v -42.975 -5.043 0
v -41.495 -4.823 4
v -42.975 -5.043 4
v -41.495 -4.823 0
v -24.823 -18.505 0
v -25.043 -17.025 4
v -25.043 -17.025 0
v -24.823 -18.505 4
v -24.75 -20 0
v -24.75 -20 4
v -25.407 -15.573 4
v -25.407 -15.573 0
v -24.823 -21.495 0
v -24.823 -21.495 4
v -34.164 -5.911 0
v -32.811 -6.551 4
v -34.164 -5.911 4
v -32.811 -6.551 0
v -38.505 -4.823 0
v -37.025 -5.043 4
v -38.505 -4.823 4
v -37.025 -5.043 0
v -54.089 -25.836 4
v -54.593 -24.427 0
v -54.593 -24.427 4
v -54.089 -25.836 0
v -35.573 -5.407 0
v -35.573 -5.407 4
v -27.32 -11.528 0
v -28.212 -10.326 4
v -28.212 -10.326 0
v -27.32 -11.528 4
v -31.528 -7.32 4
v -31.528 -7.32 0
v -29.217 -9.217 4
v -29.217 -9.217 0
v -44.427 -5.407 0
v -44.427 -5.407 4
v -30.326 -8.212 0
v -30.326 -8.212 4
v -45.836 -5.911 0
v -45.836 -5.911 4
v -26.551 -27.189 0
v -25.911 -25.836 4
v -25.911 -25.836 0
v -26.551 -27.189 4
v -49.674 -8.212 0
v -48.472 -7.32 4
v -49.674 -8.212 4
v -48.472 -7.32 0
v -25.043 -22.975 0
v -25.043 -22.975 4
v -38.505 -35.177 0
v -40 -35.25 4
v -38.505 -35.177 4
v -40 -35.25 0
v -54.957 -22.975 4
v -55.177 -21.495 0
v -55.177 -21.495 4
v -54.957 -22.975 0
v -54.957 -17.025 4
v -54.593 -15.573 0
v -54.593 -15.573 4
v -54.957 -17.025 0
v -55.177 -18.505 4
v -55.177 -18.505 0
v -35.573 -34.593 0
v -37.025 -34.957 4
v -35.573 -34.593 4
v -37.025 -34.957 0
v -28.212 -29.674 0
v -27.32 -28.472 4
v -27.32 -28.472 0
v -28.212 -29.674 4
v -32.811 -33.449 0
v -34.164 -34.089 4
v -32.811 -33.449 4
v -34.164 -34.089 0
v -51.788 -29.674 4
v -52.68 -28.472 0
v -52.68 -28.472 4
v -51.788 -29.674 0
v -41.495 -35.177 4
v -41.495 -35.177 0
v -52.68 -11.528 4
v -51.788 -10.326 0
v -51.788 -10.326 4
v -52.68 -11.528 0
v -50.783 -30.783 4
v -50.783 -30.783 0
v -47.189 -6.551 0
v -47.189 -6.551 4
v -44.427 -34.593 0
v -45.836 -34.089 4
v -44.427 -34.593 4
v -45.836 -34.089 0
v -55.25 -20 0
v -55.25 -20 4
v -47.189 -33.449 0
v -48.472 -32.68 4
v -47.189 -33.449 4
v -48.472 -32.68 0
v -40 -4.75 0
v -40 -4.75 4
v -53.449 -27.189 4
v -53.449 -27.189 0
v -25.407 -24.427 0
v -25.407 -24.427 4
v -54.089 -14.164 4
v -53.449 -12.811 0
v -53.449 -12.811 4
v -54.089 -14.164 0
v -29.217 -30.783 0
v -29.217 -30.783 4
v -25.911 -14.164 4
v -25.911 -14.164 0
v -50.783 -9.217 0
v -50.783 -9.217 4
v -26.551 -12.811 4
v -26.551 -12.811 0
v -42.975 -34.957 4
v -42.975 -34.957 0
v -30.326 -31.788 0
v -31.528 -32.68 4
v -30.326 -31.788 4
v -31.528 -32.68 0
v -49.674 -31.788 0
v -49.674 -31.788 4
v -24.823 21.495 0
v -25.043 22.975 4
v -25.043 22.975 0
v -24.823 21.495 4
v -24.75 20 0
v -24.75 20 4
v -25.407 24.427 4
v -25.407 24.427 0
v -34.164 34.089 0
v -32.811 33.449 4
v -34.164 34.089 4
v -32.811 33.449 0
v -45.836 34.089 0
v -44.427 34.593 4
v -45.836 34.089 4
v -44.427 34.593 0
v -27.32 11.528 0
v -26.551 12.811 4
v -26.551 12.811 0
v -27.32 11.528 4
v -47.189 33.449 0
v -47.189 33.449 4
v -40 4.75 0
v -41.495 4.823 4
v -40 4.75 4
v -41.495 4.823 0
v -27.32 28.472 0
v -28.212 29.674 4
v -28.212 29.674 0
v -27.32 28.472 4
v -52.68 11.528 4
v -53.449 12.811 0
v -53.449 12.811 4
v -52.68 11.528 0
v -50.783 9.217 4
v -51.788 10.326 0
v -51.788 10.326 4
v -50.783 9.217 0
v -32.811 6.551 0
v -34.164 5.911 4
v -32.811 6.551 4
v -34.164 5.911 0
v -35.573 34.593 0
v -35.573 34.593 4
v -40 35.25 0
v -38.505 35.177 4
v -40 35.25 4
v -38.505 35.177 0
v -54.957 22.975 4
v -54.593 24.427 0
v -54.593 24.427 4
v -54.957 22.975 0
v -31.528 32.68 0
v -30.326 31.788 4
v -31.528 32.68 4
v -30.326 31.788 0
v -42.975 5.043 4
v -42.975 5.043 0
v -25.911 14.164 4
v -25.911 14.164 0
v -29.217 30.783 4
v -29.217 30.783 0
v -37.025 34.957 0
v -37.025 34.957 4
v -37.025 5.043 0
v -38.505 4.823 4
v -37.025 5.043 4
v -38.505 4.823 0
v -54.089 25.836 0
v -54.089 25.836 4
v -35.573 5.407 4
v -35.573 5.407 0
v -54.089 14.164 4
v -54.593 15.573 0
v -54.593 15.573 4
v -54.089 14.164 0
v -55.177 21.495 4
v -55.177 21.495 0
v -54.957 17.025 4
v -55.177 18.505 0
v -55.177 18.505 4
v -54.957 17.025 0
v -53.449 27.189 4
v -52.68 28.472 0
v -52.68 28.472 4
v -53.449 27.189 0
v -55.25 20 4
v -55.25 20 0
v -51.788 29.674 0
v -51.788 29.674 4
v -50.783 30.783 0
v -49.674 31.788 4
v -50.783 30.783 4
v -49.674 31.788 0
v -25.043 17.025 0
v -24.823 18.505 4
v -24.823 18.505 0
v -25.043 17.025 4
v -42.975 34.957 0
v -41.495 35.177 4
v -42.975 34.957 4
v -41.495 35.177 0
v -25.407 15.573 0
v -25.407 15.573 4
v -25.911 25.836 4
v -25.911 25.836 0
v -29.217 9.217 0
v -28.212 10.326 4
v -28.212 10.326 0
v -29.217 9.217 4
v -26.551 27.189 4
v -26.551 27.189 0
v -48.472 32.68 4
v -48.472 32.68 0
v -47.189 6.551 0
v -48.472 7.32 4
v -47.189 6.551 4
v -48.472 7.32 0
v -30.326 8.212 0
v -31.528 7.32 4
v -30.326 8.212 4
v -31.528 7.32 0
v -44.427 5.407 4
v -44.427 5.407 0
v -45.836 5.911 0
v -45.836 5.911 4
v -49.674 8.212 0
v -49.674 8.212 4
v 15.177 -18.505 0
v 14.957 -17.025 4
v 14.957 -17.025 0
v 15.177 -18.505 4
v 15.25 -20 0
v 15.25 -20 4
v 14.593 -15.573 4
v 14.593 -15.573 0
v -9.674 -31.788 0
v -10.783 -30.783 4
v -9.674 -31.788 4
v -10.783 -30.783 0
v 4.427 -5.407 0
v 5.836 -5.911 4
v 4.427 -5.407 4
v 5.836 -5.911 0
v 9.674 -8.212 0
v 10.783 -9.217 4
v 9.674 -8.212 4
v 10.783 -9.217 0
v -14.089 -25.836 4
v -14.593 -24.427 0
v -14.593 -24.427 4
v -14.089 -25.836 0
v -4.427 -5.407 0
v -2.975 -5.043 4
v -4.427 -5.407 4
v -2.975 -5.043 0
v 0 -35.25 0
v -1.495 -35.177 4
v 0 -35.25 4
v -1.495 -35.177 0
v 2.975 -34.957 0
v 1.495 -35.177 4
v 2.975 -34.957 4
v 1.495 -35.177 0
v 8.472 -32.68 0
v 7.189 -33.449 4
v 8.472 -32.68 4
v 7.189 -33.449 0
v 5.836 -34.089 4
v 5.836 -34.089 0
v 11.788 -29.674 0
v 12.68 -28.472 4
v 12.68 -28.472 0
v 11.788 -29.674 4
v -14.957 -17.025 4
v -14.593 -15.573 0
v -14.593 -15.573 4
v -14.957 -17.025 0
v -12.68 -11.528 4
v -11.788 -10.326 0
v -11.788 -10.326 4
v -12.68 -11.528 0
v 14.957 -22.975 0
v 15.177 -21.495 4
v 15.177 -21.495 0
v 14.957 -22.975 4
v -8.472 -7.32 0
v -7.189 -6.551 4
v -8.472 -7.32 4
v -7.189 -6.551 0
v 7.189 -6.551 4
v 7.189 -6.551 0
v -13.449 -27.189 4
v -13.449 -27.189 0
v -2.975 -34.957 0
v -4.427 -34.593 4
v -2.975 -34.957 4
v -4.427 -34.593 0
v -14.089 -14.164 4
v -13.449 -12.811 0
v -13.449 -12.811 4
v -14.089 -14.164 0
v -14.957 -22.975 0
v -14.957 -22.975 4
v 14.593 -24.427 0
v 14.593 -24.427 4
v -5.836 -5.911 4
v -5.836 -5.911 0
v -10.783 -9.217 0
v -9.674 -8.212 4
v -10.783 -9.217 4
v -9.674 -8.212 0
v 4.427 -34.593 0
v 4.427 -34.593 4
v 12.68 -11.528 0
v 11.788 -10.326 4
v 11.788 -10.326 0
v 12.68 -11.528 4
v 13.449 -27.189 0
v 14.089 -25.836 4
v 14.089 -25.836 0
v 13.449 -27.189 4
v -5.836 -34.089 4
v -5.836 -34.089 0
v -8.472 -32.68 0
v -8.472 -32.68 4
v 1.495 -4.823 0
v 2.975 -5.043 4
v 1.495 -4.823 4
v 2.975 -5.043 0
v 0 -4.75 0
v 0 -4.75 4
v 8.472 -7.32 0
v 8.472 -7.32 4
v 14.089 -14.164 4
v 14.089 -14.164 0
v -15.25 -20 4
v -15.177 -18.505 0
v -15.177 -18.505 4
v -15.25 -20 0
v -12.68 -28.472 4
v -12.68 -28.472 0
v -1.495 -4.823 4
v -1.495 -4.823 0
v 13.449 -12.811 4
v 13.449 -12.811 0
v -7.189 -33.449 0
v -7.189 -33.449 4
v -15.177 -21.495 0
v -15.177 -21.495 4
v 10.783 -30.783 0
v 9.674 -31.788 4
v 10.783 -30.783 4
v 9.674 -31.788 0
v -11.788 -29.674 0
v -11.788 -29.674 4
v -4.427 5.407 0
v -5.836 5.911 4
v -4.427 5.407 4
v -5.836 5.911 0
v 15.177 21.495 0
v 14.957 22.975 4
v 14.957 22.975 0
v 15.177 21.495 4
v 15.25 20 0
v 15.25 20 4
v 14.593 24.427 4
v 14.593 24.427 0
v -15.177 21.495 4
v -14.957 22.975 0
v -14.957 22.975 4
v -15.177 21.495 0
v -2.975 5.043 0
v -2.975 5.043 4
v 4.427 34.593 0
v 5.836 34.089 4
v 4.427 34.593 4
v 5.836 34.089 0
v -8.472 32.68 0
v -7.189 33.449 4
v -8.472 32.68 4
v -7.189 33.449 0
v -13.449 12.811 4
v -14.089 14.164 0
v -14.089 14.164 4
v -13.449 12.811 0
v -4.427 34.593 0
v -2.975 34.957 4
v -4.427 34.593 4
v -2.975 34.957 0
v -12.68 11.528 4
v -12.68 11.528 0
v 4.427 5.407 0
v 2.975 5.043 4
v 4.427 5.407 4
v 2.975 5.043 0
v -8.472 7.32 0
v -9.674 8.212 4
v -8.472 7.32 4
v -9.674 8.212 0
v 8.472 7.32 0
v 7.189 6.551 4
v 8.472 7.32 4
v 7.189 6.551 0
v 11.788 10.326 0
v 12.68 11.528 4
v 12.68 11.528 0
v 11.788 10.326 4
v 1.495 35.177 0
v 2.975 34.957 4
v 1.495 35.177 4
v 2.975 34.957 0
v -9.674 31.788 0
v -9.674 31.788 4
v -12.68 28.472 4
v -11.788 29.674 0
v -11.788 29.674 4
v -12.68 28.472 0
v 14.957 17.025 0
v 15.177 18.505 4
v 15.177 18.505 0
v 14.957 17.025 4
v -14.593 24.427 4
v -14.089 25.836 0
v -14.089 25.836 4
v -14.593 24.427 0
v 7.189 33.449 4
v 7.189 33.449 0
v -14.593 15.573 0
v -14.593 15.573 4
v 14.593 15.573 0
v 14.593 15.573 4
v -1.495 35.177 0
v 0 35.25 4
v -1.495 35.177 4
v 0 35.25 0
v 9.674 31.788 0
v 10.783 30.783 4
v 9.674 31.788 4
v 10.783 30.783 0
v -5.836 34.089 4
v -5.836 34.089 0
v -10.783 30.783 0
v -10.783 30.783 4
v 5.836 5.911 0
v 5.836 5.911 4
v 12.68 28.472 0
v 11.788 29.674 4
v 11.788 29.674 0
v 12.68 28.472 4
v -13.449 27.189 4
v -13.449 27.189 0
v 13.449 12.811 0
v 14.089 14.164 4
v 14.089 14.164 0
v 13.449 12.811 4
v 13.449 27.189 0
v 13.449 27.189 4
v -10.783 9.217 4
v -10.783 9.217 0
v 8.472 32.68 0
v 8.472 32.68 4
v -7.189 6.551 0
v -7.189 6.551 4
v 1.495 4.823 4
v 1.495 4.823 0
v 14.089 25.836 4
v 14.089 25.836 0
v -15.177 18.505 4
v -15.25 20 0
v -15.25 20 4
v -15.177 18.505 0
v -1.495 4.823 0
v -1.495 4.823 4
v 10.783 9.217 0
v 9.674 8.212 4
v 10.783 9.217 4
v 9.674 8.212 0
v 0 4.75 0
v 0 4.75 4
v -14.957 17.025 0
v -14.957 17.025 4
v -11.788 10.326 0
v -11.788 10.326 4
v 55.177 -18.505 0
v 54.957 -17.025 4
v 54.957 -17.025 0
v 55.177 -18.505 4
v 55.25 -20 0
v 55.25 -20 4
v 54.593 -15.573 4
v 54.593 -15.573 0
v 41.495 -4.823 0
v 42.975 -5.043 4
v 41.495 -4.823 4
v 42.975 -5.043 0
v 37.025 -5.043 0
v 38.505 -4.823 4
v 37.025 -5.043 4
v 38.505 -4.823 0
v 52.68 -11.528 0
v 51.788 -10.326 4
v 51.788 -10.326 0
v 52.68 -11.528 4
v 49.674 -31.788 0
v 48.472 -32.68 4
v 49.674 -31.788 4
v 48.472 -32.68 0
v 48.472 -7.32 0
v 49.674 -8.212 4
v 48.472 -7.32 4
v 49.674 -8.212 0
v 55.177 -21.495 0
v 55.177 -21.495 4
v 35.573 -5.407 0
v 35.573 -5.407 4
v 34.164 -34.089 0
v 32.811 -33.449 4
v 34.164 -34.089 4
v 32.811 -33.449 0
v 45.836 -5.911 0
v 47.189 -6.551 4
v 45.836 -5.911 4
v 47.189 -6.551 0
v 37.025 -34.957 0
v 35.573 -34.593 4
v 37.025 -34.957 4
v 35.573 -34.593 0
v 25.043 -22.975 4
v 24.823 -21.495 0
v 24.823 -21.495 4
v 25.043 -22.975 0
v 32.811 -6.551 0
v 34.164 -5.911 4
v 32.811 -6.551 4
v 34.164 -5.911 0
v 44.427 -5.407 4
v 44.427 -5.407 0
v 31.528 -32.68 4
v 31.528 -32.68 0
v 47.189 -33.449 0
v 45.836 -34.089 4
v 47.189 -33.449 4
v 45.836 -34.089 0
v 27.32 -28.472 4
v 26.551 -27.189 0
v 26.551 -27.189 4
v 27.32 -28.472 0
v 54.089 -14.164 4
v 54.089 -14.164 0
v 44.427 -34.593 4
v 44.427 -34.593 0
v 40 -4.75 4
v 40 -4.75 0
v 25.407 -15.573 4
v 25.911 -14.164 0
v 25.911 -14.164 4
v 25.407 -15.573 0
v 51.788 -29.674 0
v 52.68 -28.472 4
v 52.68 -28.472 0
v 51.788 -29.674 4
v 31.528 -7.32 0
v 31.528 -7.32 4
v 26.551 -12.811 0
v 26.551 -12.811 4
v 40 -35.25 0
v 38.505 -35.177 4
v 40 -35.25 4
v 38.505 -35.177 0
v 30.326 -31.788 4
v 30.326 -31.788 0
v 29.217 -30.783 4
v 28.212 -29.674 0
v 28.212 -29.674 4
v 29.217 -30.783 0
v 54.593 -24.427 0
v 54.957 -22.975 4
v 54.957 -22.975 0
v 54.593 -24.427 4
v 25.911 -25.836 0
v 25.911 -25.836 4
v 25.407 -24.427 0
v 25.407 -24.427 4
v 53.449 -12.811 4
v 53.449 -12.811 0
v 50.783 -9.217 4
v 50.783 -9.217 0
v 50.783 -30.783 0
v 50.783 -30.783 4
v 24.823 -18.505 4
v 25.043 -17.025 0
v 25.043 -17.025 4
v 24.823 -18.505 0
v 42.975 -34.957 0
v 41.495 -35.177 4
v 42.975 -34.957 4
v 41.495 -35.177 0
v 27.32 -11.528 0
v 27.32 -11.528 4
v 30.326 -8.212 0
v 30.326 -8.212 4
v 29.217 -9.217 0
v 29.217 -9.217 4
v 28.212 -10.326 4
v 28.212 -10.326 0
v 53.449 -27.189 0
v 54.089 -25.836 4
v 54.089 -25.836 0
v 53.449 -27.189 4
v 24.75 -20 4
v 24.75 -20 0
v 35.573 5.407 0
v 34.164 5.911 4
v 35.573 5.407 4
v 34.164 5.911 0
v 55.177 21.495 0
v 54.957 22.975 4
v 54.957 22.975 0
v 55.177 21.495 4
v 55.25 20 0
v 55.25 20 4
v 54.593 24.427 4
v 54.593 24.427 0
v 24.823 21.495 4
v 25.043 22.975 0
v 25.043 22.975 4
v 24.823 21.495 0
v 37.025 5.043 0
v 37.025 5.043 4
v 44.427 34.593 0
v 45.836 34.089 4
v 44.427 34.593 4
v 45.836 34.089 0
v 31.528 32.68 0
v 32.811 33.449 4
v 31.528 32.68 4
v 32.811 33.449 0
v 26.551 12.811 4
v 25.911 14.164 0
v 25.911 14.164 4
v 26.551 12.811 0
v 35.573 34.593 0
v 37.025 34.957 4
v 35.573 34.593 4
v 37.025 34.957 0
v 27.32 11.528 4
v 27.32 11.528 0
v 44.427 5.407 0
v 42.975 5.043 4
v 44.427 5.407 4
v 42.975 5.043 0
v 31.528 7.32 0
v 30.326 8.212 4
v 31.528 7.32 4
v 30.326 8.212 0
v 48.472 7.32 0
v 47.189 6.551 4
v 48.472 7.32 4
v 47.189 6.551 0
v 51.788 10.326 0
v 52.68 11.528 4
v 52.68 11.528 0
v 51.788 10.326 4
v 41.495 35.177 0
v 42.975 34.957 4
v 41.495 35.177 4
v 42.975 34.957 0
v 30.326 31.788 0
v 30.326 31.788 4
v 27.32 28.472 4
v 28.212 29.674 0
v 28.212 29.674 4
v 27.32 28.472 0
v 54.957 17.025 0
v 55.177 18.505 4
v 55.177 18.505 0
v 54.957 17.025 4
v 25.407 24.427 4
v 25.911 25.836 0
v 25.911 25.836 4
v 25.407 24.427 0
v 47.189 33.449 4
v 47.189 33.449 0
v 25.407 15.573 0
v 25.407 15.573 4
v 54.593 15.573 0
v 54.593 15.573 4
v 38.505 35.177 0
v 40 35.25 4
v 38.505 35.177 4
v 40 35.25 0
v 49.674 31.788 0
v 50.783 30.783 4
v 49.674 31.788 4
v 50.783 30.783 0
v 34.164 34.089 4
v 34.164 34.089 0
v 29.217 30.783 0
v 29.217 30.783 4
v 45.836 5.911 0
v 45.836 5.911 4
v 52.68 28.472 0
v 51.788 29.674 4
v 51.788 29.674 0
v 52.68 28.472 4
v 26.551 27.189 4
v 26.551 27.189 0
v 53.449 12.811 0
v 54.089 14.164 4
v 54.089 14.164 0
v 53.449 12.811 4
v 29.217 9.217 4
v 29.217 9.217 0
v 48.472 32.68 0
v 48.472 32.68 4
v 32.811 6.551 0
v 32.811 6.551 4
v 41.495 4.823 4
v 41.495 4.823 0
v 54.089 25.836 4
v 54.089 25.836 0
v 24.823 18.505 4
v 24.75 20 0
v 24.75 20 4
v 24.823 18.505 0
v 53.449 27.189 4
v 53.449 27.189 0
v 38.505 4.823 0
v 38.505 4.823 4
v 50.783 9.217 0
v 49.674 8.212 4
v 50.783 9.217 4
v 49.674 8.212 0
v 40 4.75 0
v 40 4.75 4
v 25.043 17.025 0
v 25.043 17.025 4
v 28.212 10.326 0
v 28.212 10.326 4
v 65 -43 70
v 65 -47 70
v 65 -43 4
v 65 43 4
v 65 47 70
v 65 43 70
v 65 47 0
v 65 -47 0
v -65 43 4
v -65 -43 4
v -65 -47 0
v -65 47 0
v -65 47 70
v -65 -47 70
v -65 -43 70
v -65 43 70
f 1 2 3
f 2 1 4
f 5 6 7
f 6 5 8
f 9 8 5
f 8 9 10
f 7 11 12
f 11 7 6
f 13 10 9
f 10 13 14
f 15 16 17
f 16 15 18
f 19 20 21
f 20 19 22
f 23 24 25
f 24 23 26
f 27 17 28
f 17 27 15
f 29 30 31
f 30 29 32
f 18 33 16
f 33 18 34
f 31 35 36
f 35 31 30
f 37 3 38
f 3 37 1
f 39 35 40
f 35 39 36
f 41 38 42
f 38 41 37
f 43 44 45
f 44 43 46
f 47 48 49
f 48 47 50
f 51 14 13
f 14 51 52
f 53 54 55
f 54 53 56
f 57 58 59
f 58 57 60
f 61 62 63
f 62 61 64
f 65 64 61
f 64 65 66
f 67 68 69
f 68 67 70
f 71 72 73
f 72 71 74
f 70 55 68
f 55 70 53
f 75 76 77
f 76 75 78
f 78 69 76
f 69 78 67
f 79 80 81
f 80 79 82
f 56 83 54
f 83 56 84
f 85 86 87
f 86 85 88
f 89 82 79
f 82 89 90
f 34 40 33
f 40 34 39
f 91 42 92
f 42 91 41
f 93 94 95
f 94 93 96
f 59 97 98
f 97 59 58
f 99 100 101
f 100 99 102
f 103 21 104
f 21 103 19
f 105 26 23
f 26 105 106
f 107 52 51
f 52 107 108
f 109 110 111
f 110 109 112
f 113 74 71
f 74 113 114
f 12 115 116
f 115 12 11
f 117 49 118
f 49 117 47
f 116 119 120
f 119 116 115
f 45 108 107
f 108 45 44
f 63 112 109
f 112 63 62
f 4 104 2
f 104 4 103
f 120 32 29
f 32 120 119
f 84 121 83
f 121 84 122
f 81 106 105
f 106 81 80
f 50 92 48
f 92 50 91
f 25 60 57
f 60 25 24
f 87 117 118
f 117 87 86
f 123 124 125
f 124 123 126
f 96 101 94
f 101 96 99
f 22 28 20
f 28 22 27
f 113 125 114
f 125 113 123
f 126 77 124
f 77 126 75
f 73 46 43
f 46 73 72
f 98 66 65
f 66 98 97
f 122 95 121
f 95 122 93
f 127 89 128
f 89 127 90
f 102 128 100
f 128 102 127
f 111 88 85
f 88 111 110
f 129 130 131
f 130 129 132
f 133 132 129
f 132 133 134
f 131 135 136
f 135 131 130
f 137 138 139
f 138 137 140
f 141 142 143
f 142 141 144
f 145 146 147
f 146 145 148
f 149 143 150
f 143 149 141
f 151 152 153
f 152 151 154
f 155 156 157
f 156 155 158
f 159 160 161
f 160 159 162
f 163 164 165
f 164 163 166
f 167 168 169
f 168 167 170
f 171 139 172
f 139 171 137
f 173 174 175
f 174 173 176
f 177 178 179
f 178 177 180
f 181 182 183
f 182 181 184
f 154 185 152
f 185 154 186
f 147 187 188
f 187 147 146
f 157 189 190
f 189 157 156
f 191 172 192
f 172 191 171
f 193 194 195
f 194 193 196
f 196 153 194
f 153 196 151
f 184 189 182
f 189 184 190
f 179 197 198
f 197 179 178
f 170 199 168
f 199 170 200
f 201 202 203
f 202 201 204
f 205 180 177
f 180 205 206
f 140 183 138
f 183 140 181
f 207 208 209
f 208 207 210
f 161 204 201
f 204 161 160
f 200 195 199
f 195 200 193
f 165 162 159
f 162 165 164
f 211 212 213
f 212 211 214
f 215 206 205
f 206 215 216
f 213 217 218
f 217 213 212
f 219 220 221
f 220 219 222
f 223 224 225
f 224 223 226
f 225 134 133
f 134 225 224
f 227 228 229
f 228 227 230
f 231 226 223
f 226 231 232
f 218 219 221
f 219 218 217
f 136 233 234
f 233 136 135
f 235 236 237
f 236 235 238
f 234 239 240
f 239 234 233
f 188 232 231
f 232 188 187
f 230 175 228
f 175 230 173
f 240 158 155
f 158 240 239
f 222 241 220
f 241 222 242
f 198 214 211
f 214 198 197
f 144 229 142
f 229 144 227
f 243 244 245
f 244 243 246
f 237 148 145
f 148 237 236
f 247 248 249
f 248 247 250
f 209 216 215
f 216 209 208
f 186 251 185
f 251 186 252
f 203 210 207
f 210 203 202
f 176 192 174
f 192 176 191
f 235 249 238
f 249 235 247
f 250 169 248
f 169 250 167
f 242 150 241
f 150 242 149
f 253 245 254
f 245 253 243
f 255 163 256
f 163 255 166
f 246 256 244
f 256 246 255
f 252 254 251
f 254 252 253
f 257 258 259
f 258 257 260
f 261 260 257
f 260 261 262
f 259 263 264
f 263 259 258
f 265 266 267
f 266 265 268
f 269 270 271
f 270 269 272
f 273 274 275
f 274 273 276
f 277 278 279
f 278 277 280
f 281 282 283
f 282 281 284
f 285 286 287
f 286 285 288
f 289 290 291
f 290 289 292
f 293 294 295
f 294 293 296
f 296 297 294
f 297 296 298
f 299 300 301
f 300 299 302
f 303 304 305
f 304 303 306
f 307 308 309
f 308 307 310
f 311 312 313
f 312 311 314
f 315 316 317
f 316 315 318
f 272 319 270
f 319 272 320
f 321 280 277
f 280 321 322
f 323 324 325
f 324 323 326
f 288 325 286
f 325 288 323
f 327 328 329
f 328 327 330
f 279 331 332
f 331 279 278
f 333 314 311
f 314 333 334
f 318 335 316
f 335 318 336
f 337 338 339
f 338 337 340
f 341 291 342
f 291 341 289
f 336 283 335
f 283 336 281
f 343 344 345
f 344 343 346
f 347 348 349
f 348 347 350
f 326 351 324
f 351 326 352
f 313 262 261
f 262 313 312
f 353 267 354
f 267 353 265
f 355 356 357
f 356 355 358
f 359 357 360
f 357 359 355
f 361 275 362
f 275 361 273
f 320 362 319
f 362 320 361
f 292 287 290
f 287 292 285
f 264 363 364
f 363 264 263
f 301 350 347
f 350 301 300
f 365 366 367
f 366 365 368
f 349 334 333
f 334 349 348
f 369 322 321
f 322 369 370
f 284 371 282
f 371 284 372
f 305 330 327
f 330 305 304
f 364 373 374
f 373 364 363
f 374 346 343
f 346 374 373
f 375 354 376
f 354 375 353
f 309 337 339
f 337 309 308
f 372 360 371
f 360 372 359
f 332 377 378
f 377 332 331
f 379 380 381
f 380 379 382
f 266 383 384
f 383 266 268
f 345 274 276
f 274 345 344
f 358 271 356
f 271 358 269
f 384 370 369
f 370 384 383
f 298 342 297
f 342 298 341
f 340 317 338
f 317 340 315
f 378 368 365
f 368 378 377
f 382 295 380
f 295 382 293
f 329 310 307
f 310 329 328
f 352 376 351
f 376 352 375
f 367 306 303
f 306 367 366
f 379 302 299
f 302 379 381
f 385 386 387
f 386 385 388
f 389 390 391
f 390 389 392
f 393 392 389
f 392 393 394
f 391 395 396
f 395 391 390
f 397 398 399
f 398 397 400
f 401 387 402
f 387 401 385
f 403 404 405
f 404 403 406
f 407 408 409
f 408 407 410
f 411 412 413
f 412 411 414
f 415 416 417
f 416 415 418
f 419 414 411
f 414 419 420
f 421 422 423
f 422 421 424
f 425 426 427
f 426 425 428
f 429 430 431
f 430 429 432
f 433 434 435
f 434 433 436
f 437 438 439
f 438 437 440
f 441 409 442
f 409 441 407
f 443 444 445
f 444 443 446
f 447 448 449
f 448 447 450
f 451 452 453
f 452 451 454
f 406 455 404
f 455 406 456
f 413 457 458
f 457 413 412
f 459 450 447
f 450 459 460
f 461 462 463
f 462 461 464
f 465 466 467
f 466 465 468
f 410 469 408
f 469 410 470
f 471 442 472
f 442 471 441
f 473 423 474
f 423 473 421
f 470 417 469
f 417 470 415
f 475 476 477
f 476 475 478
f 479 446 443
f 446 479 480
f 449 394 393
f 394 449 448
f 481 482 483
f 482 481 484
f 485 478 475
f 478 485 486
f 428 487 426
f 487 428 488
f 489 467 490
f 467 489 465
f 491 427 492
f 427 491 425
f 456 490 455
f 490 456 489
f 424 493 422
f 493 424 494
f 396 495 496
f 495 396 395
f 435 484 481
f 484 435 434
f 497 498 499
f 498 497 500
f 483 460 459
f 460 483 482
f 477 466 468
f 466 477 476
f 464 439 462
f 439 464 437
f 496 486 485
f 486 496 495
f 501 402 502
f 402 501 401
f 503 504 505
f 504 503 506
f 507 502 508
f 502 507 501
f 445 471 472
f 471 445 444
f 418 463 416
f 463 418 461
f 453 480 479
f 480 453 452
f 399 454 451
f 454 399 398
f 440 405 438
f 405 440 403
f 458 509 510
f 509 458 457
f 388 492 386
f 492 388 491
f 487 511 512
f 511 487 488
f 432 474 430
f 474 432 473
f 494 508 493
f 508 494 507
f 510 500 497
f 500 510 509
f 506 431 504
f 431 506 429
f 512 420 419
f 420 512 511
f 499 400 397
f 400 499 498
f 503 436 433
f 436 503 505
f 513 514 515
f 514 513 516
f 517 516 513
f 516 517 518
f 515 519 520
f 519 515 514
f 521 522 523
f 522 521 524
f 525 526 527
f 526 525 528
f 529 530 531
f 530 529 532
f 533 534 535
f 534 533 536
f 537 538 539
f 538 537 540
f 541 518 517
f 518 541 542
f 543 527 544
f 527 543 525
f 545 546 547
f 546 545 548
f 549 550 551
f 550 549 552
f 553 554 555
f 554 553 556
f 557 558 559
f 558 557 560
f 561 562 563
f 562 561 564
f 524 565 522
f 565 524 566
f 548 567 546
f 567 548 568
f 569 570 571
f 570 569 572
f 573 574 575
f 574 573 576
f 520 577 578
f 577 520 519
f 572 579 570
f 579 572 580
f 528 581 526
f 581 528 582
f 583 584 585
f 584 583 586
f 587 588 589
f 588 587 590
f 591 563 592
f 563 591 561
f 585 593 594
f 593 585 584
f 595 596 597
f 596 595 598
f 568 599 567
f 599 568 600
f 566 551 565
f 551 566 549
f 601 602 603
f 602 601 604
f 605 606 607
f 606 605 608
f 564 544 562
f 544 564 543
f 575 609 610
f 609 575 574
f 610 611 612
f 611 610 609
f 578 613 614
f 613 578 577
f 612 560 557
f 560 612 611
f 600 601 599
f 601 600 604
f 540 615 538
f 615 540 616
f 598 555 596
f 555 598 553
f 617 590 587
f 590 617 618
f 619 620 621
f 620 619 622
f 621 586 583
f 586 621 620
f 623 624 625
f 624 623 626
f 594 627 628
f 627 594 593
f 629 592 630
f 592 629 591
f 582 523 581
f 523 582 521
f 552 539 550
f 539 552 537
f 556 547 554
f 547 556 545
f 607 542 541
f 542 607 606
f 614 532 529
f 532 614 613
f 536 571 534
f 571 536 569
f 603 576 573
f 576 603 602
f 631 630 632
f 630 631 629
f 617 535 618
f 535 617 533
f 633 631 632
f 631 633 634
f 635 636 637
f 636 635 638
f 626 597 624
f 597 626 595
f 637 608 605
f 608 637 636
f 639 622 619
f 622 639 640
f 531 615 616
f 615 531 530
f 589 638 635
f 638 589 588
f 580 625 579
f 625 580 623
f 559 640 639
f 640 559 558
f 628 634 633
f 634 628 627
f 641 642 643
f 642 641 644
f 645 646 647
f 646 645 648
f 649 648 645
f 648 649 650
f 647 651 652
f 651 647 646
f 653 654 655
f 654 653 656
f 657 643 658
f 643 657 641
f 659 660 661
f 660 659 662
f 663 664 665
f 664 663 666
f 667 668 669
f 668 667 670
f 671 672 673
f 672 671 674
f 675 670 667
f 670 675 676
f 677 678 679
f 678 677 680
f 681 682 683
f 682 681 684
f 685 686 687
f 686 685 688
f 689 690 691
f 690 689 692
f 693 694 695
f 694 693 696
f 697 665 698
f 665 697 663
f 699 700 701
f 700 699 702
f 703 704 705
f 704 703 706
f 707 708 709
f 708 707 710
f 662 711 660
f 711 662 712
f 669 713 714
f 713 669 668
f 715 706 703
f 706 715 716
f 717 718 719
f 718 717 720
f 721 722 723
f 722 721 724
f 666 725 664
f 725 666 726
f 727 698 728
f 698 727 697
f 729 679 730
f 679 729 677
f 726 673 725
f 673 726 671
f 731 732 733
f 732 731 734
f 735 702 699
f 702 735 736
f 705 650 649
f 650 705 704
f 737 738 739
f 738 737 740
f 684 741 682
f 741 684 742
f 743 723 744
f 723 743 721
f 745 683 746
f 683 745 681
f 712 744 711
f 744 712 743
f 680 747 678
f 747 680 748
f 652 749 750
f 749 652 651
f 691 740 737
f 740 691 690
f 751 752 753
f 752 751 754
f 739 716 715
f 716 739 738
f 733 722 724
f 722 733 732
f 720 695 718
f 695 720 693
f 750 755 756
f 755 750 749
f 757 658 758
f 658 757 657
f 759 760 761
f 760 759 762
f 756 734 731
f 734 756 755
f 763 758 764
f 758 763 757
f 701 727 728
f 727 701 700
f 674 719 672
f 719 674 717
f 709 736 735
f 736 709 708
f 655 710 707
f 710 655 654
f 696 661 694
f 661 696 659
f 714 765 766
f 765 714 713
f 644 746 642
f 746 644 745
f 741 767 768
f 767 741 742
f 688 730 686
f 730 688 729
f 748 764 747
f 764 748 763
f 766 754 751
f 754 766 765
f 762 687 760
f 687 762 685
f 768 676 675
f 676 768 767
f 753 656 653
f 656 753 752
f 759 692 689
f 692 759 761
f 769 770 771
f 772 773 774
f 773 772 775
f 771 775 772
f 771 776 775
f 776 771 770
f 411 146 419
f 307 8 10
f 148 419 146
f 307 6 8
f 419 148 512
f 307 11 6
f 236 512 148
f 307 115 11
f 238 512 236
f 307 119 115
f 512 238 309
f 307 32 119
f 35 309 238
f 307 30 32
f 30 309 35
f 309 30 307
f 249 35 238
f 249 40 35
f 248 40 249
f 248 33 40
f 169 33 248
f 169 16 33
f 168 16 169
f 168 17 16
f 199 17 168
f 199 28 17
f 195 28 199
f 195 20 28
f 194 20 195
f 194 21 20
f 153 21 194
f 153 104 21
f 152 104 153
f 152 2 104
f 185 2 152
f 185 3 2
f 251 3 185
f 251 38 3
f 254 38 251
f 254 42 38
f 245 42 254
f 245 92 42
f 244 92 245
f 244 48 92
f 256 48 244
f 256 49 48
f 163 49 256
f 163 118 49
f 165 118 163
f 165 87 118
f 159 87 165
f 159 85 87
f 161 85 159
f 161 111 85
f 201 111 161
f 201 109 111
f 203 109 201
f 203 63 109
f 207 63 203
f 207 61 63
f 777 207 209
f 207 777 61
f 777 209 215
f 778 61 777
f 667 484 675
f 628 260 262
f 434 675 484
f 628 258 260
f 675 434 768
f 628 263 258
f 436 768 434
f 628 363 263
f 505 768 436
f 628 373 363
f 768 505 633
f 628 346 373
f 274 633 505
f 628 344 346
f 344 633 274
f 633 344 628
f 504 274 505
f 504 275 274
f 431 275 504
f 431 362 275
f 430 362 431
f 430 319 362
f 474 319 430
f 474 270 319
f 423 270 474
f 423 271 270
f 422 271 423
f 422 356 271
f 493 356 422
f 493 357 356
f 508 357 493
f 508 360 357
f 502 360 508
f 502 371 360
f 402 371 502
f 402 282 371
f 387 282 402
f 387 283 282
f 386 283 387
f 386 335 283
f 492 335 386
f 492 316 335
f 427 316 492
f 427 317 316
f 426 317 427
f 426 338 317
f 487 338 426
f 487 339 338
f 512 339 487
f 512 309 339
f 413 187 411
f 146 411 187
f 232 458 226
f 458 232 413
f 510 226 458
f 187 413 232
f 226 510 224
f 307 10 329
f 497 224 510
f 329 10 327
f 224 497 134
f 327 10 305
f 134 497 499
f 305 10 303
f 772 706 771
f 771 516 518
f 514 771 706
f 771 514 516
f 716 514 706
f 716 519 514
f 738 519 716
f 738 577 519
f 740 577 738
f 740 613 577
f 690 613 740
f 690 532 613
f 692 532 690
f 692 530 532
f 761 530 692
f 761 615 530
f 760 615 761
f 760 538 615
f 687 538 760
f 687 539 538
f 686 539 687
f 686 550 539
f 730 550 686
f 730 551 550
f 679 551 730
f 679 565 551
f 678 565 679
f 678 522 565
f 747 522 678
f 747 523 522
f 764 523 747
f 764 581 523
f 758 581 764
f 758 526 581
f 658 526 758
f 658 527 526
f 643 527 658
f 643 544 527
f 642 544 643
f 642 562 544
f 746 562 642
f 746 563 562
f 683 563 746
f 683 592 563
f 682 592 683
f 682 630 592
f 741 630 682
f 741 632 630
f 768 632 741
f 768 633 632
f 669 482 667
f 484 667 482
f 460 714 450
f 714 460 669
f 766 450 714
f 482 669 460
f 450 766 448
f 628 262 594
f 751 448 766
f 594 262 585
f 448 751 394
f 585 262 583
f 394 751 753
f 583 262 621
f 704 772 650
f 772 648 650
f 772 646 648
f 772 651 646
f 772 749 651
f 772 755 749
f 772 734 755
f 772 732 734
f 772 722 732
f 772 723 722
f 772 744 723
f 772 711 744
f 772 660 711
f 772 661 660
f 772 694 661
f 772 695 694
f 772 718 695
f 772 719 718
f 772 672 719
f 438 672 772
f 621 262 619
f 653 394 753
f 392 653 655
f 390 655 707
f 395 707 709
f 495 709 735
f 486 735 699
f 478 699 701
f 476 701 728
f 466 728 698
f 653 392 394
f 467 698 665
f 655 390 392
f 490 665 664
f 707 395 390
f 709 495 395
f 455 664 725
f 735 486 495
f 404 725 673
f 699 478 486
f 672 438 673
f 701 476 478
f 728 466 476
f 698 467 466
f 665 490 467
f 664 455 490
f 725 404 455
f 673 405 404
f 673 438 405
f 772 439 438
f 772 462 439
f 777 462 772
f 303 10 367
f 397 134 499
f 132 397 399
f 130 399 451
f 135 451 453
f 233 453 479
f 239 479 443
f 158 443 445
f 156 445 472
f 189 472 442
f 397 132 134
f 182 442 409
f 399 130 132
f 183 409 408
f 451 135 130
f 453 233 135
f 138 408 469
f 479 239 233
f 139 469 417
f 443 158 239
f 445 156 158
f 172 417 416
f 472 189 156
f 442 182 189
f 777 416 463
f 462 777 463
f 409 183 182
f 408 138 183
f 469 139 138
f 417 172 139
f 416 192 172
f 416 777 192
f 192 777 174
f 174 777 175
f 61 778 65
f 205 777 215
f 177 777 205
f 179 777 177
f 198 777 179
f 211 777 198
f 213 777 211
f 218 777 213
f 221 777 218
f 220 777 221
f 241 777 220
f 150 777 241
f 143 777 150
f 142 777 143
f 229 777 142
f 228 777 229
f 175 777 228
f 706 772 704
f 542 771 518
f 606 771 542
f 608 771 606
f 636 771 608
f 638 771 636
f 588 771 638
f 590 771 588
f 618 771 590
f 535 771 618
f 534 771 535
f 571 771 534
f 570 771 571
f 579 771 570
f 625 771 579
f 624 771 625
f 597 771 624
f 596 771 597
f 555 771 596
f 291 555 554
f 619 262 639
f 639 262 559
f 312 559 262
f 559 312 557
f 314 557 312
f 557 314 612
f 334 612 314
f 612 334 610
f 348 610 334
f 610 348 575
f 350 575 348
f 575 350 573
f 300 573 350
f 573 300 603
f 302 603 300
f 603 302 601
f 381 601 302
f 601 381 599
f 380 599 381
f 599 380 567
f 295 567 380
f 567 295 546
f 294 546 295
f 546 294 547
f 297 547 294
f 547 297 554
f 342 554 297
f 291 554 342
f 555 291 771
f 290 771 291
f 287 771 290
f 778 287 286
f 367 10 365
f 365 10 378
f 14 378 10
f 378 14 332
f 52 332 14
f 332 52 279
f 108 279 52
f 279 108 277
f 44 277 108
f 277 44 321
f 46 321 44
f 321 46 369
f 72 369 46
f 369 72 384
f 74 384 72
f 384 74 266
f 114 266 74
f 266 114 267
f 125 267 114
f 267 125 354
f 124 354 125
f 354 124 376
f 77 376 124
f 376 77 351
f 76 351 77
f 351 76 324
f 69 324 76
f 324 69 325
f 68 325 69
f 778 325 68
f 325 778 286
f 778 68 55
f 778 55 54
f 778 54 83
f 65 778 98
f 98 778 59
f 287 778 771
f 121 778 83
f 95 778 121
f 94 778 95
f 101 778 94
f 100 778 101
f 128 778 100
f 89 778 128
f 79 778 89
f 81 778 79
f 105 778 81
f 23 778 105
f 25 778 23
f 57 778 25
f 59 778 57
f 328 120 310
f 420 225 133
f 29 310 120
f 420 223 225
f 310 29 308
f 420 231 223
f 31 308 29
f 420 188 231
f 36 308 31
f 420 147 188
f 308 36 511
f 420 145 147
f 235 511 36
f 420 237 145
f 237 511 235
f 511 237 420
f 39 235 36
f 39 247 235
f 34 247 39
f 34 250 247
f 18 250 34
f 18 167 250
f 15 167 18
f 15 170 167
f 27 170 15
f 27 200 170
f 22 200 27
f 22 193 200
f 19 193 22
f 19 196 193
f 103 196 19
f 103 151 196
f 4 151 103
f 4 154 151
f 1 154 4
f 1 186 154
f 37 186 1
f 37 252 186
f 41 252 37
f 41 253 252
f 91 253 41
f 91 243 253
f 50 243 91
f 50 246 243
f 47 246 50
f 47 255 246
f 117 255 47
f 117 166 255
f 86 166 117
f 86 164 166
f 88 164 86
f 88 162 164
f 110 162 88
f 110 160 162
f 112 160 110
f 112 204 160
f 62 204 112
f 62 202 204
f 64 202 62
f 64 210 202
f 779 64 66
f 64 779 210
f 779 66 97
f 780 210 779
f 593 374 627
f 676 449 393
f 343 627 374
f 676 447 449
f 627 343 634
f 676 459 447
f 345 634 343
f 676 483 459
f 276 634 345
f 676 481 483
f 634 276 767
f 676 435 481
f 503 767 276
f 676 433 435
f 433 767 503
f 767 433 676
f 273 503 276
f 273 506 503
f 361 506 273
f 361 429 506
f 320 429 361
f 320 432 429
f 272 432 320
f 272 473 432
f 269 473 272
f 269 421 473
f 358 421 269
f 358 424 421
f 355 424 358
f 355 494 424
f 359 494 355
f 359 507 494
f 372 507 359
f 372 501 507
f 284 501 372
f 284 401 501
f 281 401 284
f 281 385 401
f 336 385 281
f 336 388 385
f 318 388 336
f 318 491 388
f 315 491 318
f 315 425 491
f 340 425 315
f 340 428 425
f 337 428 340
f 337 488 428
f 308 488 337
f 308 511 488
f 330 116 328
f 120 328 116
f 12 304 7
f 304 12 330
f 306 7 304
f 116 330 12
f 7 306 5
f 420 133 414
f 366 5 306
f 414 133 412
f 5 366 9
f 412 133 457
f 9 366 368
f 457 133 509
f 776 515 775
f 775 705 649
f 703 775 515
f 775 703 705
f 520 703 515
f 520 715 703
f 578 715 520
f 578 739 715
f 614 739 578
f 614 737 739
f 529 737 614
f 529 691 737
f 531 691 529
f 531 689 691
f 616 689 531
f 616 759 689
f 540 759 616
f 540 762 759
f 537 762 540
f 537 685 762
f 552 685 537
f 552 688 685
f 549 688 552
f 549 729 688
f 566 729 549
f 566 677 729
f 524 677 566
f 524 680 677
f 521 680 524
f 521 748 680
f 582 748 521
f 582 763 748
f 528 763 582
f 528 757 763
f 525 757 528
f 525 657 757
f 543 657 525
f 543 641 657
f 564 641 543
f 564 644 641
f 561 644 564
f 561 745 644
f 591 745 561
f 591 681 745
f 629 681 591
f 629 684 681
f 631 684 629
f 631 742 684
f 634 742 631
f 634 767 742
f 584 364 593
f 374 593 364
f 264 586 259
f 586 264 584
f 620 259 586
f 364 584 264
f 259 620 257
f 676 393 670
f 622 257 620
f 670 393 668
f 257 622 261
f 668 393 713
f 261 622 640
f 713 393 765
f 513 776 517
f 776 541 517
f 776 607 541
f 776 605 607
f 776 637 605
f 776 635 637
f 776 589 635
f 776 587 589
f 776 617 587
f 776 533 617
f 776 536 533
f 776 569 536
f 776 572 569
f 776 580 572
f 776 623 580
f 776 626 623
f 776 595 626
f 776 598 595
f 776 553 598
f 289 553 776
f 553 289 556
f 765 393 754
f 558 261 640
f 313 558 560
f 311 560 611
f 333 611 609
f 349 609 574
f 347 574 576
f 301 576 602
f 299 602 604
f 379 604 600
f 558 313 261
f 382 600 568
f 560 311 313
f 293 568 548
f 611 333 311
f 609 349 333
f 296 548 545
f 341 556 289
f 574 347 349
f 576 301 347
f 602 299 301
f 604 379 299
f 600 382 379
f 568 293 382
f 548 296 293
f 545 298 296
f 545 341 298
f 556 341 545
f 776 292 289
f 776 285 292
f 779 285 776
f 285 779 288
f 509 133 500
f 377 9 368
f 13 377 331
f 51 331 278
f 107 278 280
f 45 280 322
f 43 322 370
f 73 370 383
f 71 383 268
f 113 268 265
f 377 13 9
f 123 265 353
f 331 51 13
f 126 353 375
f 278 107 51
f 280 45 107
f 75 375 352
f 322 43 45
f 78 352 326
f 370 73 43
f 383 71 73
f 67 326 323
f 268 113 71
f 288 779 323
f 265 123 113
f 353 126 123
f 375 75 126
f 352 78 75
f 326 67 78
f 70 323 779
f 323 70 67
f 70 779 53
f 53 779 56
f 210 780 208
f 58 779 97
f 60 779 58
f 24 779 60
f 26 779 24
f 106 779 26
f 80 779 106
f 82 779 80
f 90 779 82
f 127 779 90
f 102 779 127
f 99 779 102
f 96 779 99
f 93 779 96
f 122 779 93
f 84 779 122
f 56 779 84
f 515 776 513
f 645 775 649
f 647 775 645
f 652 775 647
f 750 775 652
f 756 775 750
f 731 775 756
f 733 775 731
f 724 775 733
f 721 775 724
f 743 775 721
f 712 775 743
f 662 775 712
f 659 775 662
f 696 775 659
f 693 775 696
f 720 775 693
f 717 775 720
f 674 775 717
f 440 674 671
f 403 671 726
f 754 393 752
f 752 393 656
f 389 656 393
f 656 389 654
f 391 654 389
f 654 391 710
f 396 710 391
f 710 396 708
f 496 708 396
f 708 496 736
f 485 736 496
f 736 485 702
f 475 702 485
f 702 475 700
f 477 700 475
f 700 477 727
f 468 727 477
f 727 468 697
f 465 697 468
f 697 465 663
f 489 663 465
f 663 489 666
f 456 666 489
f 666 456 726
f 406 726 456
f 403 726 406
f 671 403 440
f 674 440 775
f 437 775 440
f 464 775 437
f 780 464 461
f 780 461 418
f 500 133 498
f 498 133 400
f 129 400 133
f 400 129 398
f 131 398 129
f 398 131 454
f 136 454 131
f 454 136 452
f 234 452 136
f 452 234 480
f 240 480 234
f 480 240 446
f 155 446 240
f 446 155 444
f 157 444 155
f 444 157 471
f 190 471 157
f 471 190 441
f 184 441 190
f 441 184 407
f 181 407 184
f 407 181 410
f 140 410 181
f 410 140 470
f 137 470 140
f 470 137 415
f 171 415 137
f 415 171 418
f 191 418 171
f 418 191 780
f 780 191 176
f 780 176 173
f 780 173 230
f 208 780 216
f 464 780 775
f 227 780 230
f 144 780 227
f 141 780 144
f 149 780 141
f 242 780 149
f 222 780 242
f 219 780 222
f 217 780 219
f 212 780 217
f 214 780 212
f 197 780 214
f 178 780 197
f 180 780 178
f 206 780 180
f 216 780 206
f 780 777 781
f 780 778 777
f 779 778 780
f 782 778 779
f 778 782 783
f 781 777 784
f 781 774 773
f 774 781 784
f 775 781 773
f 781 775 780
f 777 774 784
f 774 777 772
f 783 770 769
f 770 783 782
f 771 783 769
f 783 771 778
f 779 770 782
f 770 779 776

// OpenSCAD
// 50 mL conical tube rack – printed upside-down, then flipped over.
// Print orientation: flat plate on the bed (z = 0..4), walls rising in +Z.
// After flipping: rack stands on the two walls; tubes pass through the holes.

// ---- Plate ----
plate_x   = 130;   // plate length along X (mm)
plate_y   = 90;    // plate width  along Y (mm)
plate_t   = 4;     // plate thickness (mm)

// ---- Tube holes ----
hole_d    = 30.5;  // through-hole diameter (mm)
hole_r    = hole_d / 2;
pitch     = 40;    // centre-to-centre spacing in both X and Y (mm)

// ---- Side walls (run along the two long edges, flush with the plate) ----
wall_len  = 130;   // wall length along X (mm)
wall_t    = 4;     // wall thickness along Y (mm)
wall_h    = 70;    // wall height above the bed (mm)

$fn = 64;

// Hole centres: 2 rows (Y) x 3 columns (X), centred on the plate.
// X offsets: -40, 0, +40   (3 columns, 40 mm pitch)
// Y offsets: -20, +20       (2 rows,    40 mm pitch)
hole_x = [-pitch, 0, pitch];
hole_y = [-pitch / 2, pitch / 2];

// ---- Base plate with six through-holes (sits on the bed, z = 0..4) ----
module plate() { difference() {
    translate([-plate_x / 2, -plate_y / 2, 0]) {
        cube([plate_x, plate_y, plate_t]);
    }
    for (hx = hole_x) {
        for (hy = hole_y) {
            translate([hx, hy, -0.5]) {
                cylinder(h = plate_t + 1, r = hole_r, $fn = $fn);
            }
        }
    }
} }

// ---- Two solid walls along the long edges, flush with the plate ----
// Each wall: 130 mm (X) x 4 mm (Y) x 70 mm (Z), centred on the plate in X,
// centred on the plate's long edge in Y (so it spans Y = ±45..±49),
// rising from z = 0 to z = 70.
module walls() { union() {
    // Wall on the +Y edge
    translate([-wall_len / 2,  plate_y / 2 - wall_t / 2, 0]) {
        cube([wall_len, wall_t, wall_h]);
    }
    // Wall on the -Y edge
    translate([-wall_len / 2, -plate_y / 2 - wall_t / 2, 0]) {
        cube([wall_len, wall_t, wall_h]);
    }
} }

// ---- Assemble the rack in print orientation (single solid, centred on origin) ----
union() {
    plate();
    walls();
}
